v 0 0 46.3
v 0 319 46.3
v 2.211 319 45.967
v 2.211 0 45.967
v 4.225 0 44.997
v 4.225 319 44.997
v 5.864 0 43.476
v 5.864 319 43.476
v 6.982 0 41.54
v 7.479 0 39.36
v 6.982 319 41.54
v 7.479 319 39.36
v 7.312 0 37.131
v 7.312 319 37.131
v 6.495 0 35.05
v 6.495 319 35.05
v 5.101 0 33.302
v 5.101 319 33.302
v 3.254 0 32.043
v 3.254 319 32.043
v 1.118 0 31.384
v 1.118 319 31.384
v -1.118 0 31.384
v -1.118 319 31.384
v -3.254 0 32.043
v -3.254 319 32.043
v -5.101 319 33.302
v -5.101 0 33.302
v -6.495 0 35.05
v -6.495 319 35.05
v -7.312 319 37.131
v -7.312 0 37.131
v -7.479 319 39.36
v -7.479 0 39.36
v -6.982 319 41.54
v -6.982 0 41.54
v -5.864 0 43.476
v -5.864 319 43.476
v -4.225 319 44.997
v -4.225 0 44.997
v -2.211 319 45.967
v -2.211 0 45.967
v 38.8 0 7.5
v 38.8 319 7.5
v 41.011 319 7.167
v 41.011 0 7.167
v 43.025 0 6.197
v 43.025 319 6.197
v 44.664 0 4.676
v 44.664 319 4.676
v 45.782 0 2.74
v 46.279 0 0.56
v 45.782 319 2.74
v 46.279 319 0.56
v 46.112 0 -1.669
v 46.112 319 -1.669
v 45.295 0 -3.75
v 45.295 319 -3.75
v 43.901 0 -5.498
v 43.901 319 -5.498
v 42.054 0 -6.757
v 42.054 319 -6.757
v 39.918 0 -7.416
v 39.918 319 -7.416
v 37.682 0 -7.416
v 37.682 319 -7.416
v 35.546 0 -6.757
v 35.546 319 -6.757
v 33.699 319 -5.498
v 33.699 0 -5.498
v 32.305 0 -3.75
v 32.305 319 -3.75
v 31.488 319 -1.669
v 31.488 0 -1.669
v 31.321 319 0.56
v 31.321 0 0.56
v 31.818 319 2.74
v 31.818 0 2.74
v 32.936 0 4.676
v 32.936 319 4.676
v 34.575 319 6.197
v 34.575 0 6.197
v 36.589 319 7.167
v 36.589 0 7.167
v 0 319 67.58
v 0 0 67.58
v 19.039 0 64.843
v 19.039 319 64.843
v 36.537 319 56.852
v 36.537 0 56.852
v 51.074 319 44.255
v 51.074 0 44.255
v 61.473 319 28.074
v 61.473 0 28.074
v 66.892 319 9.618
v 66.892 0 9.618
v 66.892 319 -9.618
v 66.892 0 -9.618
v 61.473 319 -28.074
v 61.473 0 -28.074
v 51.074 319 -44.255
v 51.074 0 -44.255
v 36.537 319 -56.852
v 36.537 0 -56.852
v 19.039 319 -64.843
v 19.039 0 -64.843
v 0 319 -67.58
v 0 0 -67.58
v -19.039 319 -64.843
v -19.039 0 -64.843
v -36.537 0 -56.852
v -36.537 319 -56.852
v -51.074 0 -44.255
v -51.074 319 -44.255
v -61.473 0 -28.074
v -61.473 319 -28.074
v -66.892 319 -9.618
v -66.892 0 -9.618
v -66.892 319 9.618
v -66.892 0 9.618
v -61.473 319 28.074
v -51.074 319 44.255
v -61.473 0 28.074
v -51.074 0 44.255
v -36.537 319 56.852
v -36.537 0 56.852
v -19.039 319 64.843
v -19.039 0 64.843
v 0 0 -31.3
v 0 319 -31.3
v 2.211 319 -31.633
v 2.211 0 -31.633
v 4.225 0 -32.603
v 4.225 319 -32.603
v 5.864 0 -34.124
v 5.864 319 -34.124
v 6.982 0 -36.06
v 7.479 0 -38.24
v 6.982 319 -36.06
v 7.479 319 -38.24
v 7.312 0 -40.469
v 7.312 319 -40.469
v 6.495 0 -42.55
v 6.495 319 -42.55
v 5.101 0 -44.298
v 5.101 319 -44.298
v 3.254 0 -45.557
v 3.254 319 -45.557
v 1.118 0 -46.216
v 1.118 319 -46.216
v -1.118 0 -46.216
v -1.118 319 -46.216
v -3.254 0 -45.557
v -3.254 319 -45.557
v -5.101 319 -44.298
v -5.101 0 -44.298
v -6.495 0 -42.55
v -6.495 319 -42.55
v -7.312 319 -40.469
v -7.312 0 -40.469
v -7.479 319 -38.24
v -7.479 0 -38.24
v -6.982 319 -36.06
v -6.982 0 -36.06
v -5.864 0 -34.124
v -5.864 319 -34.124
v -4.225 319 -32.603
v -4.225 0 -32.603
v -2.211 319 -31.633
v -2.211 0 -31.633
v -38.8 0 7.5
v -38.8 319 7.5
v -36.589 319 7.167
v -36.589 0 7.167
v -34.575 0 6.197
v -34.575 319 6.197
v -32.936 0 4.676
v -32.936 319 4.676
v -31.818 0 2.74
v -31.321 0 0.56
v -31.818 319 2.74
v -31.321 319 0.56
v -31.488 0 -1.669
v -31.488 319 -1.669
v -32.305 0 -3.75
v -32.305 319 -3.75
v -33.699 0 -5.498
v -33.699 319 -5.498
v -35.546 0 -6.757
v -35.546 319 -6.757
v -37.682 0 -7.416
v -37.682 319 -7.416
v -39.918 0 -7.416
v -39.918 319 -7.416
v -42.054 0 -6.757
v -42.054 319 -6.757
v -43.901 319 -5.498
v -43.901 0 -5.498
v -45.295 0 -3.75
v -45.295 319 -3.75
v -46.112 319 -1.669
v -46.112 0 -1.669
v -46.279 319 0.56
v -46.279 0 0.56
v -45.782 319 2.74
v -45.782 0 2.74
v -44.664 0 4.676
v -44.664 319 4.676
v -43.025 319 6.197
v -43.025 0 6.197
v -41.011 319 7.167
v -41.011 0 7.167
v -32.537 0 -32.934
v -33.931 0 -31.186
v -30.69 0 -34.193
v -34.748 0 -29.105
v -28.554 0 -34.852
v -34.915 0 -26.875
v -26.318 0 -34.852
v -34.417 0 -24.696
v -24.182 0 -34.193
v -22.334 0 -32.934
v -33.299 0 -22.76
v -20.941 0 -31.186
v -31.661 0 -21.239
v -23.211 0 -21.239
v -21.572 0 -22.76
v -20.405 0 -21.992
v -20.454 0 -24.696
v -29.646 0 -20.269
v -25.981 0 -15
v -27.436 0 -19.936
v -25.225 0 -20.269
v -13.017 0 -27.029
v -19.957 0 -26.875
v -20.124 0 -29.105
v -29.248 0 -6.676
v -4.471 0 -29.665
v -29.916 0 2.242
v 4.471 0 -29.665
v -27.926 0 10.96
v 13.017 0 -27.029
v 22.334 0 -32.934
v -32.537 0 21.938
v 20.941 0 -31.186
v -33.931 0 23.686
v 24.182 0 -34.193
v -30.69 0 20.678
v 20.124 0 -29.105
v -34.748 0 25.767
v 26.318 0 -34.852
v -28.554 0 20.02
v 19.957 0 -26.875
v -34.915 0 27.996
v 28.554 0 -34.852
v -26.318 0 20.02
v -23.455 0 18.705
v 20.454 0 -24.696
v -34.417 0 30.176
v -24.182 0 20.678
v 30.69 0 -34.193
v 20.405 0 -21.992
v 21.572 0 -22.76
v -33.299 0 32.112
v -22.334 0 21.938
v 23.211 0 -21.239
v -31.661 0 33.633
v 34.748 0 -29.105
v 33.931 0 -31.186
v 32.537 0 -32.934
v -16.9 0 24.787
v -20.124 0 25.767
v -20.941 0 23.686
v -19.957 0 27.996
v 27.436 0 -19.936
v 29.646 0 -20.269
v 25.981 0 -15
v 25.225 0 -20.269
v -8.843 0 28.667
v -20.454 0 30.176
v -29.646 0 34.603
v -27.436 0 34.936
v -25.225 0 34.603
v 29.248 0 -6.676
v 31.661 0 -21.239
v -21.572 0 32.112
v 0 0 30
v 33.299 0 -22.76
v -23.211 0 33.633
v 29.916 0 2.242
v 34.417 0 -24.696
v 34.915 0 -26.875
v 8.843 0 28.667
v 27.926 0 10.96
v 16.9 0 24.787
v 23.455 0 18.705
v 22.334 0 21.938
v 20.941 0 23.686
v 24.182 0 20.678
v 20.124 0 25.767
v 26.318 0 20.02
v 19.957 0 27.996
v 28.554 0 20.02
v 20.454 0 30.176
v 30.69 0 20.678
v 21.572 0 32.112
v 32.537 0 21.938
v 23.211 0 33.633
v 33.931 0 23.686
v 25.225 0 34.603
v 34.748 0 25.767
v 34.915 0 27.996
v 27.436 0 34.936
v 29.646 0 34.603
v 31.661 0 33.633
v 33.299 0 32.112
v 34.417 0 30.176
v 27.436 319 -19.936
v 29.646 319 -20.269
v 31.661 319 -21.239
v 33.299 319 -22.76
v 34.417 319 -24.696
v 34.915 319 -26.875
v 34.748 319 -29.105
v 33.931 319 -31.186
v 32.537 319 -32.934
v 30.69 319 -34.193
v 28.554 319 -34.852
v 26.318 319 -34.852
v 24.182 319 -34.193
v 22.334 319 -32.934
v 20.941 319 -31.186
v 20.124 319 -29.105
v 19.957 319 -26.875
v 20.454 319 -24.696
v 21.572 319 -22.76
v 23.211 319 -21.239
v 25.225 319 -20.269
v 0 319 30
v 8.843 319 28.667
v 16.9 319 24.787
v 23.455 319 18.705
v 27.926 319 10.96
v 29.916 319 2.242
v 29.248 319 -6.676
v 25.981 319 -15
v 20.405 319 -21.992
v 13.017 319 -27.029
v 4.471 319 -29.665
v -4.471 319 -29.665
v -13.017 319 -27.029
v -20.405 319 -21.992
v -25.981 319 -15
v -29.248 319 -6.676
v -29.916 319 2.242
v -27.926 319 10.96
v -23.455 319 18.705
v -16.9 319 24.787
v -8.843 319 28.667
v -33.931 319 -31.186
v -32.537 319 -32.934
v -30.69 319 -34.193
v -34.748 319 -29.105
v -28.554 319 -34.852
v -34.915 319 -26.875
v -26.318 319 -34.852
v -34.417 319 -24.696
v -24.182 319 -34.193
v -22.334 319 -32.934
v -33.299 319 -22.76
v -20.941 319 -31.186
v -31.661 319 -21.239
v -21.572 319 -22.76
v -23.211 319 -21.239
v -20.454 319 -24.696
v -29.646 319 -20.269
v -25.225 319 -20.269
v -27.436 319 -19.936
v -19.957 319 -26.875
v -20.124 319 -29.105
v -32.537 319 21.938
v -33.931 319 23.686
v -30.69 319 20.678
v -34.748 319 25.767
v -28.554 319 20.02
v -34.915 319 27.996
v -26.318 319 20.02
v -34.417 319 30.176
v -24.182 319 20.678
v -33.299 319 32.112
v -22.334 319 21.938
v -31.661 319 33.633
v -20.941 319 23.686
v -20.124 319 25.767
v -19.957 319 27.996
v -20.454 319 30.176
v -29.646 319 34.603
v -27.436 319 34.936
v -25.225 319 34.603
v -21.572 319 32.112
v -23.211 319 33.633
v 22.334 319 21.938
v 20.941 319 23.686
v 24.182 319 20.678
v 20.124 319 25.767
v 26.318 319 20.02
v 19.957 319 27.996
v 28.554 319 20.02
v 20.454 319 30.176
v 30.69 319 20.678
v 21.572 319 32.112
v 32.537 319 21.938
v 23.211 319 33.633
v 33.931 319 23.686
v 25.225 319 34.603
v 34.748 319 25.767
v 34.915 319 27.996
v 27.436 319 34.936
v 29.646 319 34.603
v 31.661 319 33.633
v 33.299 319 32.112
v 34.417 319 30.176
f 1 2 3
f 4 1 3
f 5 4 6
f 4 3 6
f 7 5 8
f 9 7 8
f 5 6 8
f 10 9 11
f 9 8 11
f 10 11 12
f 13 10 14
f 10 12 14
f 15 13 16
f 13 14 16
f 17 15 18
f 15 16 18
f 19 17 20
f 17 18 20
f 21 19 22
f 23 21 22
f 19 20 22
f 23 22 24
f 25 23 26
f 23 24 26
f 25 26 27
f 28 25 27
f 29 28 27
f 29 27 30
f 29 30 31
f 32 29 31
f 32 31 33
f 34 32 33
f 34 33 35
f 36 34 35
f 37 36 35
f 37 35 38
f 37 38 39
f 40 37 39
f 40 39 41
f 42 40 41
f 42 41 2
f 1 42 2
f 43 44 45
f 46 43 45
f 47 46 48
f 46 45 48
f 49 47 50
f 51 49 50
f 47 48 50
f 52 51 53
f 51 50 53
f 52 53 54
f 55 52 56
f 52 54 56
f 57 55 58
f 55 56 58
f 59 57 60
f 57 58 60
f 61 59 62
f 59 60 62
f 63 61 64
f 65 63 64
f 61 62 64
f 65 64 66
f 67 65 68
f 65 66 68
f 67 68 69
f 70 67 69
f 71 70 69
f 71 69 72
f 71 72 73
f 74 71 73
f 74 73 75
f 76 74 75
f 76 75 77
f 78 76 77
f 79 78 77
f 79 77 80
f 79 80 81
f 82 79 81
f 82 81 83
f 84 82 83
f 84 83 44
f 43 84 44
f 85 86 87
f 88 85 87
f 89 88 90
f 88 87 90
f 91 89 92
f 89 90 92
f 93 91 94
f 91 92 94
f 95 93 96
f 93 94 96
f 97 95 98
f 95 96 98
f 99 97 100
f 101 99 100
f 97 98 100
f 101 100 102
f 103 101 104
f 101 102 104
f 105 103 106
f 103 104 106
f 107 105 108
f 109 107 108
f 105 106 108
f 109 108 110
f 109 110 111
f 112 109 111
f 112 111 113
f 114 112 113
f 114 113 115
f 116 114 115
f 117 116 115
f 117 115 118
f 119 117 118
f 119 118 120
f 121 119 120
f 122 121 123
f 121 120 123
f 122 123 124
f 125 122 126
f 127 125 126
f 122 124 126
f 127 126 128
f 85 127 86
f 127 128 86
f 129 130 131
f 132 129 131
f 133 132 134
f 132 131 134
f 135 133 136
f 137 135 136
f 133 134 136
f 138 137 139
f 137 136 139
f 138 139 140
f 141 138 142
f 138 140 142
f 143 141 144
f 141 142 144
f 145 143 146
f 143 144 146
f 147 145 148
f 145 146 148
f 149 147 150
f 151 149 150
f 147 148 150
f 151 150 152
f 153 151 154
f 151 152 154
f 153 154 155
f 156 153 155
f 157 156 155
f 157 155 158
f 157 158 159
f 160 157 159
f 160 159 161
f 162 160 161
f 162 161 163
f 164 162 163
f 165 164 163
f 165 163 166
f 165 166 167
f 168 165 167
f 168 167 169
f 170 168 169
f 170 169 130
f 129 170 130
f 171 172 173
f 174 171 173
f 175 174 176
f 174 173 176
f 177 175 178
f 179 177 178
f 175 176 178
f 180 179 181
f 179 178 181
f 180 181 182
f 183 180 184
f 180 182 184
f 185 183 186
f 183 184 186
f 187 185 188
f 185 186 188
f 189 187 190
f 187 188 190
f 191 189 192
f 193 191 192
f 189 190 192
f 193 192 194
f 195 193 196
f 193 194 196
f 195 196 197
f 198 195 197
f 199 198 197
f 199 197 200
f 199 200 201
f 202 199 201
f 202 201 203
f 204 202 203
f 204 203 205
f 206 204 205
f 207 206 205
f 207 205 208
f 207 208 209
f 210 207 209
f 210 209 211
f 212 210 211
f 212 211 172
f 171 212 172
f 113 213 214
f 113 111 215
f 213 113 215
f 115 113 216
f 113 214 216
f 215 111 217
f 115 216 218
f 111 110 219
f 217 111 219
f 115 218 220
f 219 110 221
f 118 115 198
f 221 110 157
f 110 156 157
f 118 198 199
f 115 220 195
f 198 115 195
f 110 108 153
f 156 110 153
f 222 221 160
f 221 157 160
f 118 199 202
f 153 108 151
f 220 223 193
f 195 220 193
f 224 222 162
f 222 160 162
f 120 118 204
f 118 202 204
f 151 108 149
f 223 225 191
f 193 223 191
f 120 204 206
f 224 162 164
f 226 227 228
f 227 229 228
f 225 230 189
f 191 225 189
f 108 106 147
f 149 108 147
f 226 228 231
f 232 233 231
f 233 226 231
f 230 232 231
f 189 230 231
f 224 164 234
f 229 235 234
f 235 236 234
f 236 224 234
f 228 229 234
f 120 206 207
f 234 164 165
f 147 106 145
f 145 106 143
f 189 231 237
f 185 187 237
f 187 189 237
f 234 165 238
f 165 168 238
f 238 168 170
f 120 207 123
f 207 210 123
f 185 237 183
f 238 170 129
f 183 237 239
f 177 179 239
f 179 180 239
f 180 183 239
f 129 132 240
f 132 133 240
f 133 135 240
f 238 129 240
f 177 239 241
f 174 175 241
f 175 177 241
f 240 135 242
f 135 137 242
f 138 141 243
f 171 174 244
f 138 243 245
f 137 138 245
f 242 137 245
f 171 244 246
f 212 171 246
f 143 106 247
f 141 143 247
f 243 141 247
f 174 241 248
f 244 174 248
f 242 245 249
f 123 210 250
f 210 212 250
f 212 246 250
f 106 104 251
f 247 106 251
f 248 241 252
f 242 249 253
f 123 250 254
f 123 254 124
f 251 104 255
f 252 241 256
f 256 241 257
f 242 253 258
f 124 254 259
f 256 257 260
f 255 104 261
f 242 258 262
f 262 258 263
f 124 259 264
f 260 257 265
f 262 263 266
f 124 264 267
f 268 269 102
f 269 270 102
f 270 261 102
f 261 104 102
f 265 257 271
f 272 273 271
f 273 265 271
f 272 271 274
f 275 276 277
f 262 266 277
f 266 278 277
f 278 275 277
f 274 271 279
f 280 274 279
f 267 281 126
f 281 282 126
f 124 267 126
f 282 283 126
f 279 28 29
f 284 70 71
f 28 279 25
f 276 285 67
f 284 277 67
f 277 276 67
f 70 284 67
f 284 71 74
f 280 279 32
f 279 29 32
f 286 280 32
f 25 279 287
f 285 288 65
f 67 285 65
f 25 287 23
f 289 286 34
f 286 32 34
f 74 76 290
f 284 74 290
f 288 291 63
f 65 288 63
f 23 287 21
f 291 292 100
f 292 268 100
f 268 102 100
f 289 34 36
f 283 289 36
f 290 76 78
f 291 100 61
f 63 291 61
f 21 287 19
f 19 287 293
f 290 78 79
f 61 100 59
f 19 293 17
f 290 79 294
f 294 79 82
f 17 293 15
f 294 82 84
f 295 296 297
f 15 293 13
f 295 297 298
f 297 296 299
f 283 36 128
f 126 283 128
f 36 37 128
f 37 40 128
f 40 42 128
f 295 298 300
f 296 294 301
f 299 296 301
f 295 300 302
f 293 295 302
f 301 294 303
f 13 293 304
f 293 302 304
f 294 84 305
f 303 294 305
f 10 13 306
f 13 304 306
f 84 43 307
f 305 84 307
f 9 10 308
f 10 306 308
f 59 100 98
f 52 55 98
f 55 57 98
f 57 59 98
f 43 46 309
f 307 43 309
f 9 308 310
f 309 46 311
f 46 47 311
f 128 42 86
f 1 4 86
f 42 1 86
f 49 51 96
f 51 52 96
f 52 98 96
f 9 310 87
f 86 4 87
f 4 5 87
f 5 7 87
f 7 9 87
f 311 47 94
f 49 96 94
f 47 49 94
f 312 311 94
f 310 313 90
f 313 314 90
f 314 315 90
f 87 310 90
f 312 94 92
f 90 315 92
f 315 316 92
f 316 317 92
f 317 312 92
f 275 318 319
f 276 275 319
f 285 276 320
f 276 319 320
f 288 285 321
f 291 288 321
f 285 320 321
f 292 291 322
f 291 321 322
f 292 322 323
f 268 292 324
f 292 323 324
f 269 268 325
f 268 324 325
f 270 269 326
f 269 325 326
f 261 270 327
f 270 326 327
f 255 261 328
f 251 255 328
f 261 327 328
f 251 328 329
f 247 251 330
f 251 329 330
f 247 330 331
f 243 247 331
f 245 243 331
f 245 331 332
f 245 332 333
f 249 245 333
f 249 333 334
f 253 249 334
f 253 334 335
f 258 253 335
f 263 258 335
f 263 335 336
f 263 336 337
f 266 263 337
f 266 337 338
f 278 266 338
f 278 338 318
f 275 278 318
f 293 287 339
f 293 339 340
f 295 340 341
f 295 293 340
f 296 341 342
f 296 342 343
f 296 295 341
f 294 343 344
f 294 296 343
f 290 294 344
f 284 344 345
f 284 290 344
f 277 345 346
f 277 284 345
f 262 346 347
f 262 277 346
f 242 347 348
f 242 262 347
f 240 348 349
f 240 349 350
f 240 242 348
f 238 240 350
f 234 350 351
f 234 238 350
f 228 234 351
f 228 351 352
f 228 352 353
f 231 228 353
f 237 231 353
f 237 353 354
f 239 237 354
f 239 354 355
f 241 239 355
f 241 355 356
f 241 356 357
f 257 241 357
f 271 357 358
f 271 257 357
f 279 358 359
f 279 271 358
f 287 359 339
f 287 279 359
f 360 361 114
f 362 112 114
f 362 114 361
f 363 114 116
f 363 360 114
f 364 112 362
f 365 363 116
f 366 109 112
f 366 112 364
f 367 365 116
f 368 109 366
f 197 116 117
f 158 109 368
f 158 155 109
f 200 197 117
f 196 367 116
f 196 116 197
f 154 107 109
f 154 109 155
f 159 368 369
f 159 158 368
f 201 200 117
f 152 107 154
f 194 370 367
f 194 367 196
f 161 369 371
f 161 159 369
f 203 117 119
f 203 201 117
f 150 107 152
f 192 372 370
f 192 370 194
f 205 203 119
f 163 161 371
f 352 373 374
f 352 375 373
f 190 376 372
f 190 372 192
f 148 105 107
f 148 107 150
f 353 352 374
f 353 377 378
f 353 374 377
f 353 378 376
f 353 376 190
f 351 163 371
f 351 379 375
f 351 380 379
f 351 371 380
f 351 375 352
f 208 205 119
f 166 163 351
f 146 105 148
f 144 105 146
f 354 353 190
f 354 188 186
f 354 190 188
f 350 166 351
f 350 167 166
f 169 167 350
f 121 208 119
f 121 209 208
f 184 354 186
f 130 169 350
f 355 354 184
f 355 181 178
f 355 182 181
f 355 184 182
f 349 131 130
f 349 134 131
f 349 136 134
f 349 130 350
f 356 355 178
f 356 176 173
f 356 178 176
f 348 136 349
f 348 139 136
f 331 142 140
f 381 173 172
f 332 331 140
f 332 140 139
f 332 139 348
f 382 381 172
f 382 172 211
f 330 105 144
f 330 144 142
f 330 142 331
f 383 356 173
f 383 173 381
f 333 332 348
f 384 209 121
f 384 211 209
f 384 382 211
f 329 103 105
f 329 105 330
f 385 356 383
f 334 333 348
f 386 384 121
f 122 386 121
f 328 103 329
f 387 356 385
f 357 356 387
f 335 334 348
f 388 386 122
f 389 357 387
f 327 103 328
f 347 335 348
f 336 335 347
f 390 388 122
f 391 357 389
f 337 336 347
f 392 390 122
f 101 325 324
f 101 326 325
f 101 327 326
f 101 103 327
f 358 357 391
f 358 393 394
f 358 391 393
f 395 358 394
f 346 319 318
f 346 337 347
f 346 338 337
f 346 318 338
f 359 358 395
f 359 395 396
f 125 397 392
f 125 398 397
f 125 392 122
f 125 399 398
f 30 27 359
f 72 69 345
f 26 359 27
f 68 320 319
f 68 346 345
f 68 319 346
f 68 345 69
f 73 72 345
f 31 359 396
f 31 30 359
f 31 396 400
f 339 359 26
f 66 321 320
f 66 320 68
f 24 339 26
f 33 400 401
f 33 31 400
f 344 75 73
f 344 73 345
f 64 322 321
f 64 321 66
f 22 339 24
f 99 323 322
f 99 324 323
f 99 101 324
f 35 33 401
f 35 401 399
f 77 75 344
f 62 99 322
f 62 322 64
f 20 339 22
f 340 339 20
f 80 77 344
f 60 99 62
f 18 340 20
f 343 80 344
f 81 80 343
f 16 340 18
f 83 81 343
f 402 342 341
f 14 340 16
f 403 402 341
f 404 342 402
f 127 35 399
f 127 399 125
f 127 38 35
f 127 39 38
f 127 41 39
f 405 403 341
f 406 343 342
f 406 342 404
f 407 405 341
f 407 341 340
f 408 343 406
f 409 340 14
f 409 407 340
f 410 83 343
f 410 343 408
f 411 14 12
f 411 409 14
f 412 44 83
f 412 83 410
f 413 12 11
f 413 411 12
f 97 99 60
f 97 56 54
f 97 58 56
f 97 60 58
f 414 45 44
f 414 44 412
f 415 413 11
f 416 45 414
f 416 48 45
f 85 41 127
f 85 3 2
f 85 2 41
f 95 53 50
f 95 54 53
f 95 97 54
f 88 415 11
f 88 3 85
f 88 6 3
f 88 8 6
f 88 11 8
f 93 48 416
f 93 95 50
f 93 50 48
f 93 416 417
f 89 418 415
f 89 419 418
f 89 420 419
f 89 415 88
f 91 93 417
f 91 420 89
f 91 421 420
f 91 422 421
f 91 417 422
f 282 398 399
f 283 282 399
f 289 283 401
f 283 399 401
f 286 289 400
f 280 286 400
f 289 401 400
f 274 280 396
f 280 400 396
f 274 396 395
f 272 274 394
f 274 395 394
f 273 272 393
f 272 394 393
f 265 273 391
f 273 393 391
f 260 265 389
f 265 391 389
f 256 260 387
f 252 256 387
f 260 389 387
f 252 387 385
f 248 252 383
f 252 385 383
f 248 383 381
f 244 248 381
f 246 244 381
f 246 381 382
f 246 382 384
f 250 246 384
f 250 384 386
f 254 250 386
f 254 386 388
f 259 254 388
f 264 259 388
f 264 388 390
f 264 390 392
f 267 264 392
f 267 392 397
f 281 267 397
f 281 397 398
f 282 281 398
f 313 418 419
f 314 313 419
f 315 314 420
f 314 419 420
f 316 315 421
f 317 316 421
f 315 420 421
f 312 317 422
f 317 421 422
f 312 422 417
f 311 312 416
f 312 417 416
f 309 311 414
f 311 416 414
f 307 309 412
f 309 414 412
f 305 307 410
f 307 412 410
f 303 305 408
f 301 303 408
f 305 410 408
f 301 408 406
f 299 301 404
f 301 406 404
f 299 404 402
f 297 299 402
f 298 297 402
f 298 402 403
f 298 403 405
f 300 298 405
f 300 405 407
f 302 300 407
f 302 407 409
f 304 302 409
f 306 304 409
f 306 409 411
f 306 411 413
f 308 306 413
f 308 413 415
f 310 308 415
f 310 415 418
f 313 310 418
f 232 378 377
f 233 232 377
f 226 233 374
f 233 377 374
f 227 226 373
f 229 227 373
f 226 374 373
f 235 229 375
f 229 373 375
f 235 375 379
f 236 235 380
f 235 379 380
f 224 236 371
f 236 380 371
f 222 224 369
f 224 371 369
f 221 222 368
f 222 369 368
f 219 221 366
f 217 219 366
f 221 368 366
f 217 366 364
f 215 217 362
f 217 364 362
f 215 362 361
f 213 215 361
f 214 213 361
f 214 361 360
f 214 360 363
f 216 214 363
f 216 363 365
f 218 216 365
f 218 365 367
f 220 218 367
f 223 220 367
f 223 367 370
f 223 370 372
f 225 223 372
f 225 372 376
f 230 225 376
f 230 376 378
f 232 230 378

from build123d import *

# Parameters (mm, degrees)
SKETCH_1_R          = 67.58
SKETCH_1_R_2        = 30
EXTRUDE_1_DEPTH     = 319
CUT_EXTRUDE_1_REACH = 335.009
SKETCH_2_R          = 7.5


with BuildPart() as part:
    # 草图1 → 凸台-拉伸1 (new body)
    with BuildSketch(Plane(origin=(0, 0, 0), x_dir=(1, 0, 0), z_dir=(0, 1, 0))):
        with Locations(Location((0, 0, 0), (0, 0, 270))):
            Circle(SKETCH_1_R)
        with Locations(Location((0, 0, 0), (0, 0, 270))):
            Circle(SKETCH_1_R_2, mode=Mode.SUBTRACT)
    extrude(amount=EXTRUDE_1_DEPTH)

    # 草图2 → 切除-拉伸1 (cut, up to next)
    with BuildSketch(Plane(origin=(0, 319, 0), x_dir=(1, 0, 0), z_dir=(0, 1, 0)), mode=Mode.PRIVATE) as cut_extrude_1_sk1:
        with Locations(Location((-38.8, 0, 0), (0, 0, 270))):
            Circle(SKETCH_2_R)
    cut_extrude_1_tool1 = extrude(cut_extrude_1_sk1.sketch, amount=-CUT_EXTRUDE_1_REACH, mode=Mode.PRIVATE) & part.part
    # 草图2 → 切除-拉伸1 (cut, up to next)
    with BuildSketch(Plane(origin=(0, 319, 0), x_dir=(1, 0, 0), z_dir=(0, 1, 0)), mode=Mode.PRIVATE) as cut_extrude_1_sk2:
        with Locations(Location((-27.43574311, 27.43574311, 0), (0, 0, 270))):
            Circle(SKETCH_2_R)
    cut_extrude_1_tool2 = extrude(cut_extrude_1_sk2.sketch, amount=-CUT_EXTRUDE_1_REACH, mode=Mode.PRIVATE) & part.part
    # 草图2 → 切除-拉伸1 (cut, up to next)
    with BuildSketch(Plane(origin=(0, 319, 0), x_dir=(1, 0, 0), z_dir=(0, 1, 0)), mode=Mode.PRIVATE) as cut_extrude_1_sk3:
        with Locations(Location((0, 38.8, 0), (0, 0, 270))):
            Circle(SKETCH_2_R)
    cut_extrude_1_tool3 = extrude(cut_extrude_1_sk3.sketch, amount=-CUT_EXTRUDE_1_REACH, mode=Mode.PRIVATE) & part.part
    # 草图2 → 切除-拉伸1 (cut, up to next)
    with BuildSketch(Plane(origin=(0, 319, 0), x_dir=(1, 0, 0), z_dir=(0, 1, 0)), mode=Mode.PRIVATE) as cut_extrude_1_sk4:
        with Locations(Location((27.43574311, 27.43574311, 0), (0, 0, 270))):
            Circle(SKETCH_2_R)
    cut_extrude_1_tool4 = extrude(cut_extrude_1_sk4.sketch, amount=-CUT_EXTRUDE_1_REACH, mode=Mode.PRIVATE) & part.part
    # 草图2 → 切除-拉伸1 (cut, up to next)
    with BuildSketch(Plane(origin=(0, 319, 0), x_dir=(1, 0, 0), z_dir=(0, 1, 0)), mode=Mode.PRIVATE) as cut_extrude_1_sk5:
        with Locations(Location((38.8, 0, 0), (0, 0, 270))):
            Circle(SKETCH_2_R)
    cut_extrude_1_tool5 = extrude(cut_extrude_1_sk5.sketch, amount=-CUT_EXTRUDE_1_REACH, mode=Mode.PRIVATE) & part.part
    # 草图2 → 切除-拉伸1 (cut, up to next)
    with BuildSketch(Plane(origin=(0, 319, 0), x_dir=(1, 0, 0), z_dir=(0, 1, 0)), mode=Mode.PRIVATE) as cut_extrude_1_sk6:
        with Locations(Location((27.43574311, -27.43574311, 0), (0, 0, 270))):
            Circle(SKETCH_2_R)
    cut_extrude_1_tool6 = extrude(cut_extrude_1_sk6.sketch, amount=-CUT_EXTRUDE_1_REACH, mode=Mode.PRIVATE) & part.part
    # 草图2 → 切除-拉伸1 (cut, up to next)
    with BuildSketch(Plane(origin=(0, 319, 0), x_dir=(1, 0, 0), z_dir=(0, 1, 0)), mode=Mode.PRIVATE) as cut_extrude_1_sk7:
        with Locations(Location((0, -38.8, 0), (0, 0, 270))):
            Circle(SKETCH_2_R)
    cut_extrude_1_tool7 = extrude(cut_extrude_1_sk7.sketch, amount=-CUT_EXTRUDE_1_REACH, mode=Mode.PRIVATE) & part.part
    # 草图2 → 切除-拉伸1 (cut, up to next)
    with BuildSketch(Plane(origin=(0, 319, 0), x_dir=(1, 0, 0), z_dir=(0, 1, 0)), mode=Mode.PRIVATE) as cut_extrude_1_sk8:
        with Locations(Location((-27.43574311, -27.43574311, 0), (0, 0, 270))):
            Circle(SKETCH_2_R)
    cut_extrude_1_tool8 = extrude(cut_extrude_1_sk8.sketch, amount=-CUT_EXTRUDE_1_REACH, mode=Mode.PRIVATE) & part.part
    add(cut_extrude_1_tool1.solids().sort_by_distance((-38.8, 319, 0))[0], mode=Mode.SUBTRACT)
    add(cut_extrude_1_tool2.solids().sort_by_distance((-27.435743, 319, -27.435743))[0], mode=Mode.SUBTRACT)
    add(cut_extrude_1_tool3.solids().sort_by_distance((0, 319, -38.8))[0], mode=Mode.SUBTRACT)
    add(cut_extrude_1_tool4.solids().sort_by_distance((27.435743, 319, -27.435743))[0], mode=Mode.SUBTRACT)
    add(cut_extrude_1_tool5.solids().sort_by_distance((38.8, 319, 0))[0], mode=Mode.SUBTRACT)
    add(cut_extrude_1_tool6.solids().sort_by_distance((27.435743, 319, 27.435743))[0], mode=Mode.SUBTRACT)
    add(cut_extrude_1_tool7.solids().sort_by_distance((0, 319, 38.8))[0], mode=Mode.SUBTRACT)
    add(cut_extrude_1_tool8.solids().sort_by_distance((-27.435743, 319, 27.435743))[0], mode=Mode.SUBTRACT)


solid = part.part
